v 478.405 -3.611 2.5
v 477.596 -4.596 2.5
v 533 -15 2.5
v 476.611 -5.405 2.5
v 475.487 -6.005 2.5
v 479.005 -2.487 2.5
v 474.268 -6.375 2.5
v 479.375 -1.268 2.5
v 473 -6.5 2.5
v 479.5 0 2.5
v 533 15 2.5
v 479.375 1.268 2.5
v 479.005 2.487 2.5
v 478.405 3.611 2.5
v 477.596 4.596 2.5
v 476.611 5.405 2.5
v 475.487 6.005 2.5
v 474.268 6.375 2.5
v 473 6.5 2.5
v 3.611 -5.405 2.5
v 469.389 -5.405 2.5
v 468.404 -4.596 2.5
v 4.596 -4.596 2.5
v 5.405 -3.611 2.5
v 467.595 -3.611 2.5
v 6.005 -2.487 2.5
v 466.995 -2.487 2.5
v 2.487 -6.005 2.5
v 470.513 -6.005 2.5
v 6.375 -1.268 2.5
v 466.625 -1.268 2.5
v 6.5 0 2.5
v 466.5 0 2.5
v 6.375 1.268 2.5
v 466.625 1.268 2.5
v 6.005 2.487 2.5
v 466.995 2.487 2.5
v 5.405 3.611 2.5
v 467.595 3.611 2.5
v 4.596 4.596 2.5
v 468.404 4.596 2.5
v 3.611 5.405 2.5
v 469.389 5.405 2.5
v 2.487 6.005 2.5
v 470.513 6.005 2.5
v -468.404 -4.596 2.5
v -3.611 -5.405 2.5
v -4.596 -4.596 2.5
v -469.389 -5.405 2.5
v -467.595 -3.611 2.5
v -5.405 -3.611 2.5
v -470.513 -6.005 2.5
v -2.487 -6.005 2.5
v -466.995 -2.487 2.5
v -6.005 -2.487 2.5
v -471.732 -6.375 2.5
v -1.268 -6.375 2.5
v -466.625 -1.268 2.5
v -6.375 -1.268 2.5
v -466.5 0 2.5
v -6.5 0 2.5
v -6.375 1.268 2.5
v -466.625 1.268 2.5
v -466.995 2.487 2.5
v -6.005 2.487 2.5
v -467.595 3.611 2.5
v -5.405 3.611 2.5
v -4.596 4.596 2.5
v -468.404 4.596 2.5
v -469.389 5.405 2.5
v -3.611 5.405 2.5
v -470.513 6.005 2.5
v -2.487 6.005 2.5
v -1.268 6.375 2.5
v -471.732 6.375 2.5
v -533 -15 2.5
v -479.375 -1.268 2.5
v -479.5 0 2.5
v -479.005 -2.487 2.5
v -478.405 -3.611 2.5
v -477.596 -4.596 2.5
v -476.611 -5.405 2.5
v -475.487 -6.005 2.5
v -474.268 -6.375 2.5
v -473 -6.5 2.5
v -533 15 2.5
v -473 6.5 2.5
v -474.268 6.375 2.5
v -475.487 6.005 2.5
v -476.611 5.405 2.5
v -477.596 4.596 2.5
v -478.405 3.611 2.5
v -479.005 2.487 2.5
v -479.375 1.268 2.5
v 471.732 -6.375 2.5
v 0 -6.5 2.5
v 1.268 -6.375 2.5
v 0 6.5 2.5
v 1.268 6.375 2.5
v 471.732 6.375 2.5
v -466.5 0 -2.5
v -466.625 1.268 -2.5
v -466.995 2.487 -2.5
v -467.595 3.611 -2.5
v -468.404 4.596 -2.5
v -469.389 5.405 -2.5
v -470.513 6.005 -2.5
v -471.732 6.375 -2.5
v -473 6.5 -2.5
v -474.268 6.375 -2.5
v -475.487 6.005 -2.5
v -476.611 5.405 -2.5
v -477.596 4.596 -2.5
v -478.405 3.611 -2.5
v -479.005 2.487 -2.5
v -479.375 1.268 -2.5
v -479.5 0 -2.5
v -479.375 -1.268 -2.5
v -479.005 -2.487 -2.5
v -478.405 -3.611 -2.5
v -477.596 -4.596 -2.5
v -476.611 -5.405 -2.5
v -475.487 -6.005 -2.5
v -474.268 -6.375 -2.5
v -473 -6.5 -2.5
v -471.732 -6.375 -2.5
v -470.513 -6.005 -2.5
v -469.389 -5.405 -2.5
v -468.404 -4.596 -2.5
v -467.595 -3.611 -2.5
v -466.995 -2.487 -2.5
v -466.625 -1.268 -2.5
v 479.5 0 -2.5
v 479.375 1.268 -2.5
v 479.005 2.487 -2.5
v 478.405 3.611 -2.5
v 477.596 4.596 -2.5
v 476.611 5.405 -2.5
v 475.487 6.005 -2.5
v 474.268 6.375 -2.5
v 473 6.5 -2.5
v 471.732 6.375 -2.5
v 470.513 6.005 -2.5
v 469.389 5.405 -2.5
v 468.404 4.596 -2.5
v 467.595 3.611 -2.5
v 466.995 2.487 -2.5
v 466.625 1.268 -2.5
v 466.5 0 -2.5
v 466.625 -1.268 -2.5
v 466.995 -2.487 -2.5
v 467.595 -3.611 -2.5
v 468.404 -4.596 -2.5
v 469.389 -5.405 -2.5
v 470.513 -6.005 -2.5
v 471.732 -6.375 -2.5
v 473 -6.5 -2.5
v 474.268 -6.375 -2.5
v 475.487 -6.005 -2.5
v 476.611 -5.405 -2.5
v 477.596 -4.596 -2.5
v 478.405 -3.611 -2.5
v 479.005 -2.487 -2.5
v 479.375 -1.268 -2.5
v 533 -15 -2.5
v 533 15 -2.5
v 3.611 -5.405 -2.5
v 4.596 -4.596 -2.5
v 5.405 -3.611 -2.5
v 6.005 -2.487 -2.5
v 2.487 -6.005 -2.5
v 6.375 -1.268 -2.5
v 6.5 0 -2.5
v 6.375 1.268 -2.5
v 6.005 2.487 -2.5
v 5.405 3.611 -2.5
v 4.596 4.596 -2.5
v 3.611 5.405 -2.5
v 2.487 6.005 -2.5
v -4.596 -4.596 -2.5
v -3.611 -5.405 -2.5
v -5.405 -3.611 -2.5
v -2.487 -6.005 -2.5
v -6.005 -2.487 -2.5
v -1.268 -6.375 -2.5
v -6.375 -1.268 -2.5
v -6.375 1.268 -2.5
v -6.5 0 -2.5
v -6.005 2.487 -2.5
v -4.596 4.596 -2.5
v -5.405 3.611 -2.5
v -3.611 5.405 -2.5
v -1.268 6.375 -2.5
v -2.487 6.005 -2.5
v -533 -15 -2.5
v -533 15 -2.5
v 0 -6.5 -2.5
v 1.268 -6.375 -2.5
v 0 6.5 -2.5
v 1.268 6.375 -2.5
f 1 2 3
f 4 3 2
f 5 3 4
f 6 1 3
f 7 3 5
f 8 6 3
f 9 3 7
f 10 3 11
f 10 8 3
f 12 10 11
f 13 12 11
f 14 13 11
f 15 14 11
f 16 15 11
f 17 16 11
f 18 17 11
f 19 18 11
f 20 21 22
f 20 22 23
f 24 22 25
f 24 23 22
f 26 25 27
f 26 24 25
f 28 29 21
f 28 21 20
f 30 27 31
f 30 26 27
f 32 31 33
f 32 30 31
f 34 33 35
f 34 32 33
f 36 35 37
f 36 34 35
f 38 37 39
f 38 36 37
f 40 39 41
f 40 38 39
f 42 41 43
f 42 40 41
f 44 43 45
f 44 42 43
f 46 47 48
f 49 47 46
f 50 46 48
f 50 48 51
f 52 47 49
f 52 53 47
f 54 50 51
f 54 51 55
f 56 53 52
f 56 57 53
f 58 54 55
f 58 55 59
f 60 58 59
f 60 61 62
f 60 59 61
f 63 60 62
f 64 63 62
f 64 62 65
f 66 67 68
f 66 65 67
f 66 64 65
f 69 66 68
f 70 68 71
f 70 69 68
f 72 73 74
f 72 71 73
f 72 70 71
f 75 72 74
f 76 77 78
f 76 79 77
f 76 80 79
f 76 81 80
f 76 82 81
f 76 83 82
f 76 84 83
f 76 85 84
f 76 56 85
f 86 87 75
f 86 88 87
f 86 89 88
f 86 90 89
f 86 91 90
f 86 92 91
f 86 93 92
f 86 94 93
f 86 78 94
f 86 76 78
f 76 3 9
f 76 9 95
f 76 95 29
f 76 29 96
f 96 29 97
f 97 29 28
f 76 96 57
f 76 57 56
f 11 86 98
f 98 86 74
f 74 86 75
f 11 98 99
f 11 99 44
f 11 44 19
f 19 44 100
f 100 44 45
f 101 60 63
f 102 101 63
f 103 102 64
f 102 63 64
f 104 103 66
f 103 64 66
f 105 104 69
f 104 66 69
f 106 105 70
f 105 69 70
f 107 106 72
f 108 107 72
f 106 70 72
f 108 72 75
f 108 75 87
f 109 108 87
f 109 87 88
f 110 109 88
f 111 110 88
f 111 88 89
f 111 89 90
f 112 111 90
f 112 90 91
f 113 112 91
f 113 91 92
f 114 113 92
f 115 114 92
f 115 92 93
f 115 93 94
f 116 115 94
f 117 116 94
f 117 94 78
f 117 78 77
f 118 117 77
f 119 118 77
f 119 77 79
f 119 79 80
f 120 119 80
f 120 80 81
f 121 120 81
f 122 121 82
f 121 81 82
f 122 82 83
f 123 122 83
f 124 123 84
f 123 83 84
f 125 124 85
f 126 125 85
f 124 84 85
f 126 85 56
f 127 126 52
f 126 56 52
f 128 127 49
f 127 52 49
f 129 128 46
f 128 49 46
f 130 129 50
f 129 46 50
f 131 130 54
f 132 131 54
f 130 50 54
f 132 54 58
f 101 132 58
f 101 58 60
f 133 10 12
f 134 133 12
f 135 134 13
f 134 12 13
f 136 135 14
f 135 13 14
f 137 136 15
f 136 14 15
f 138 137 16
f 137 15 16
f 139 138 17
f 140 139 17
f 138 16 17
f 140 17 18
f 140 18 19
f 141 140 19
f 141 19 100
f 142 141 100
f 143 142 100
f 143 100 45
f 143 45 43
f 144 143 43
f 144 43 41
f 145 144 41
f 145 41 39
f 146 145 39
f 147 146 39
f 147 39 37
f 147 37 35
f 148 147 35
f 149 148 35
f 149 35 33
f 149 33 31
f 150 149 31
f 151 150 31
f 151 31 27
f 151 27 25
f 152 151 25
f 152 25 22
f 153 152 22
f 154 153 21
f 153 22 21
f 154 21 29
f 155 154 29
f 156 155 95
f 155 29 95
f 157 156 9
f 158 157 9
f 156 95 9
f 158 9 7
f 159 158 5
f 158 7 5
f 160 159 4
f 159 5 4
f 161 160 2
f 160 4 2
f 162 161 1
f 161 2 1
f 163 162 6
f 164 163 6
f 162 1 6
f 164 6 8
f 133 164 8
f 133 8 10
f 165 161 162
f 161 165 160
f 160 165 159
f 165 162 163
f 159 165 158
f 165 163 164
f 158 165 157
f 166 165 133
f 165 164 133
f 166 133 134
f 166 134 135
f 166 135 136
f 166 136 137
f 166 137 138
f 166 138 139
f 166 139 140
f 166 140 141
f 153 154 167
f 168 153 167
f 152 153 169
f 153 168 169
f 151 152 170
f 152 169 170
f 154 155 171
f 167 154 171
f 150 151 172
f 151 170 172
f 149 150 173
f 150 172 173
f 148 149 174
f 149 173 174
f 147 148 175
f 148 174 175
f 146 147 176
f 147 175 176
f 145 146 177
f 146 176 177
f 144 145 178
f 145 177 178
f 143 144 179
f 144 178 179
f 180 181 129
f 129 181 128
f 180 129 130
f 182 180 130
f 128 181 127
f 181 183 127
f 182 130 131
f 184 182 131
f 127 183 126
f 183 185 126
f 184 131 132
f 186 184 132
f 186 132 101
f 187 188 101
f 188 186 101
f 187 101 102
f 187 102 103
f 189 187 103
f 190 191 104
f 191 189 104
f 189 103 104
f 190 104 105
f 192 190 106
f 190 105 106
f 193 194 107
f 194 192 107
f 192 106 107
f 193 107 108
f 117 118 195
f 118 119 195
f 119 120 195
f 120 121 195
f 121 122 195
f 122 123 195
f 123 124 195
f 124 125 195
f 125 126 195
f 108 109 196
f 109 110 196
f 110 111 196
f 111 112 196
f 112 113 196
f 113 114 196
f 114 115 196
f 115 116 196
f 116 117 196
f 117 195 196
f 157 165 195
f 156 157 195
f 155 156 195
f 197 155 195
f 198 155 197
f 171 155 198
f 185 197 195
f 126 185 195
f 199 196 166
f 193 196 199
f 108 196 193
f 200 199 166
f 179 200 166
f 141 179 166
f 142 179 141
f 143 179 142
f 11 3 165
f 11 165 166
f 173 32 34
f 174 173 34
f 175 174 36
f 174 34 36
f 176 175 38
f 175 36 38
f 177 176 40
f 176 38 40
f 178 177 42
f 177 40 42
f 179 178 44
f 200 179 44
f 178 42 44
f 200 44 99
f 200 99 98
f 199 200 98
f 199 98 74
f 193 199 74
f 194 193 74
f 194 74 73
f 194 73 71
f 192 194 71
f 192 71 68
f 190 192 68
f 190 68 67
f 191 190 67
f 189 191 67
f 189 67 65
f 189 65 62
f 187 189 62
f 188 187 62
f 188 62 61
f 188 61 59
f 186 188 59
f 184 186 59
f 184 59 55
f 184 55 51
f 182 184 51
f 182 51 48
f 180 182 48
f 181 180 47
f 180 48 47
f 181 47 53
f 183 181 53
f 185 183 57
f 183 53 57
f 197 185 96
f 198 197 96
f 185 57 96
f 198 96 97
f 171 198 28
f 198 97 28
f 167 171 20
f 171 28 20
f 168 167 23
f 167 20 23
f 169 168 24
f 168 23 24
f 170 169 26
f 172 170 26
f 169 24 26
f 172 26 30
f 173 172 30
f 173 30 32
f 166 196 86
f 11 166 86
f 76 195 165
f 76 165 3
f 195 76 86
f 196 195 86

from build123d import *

# Parameters (mm, degrees)
PLAT_W                          = 30
PLAT_H                          = 5
EL_MENT_M_CANO_SOUD_1_DEPTH     = 1066
DIAM_TRE_DU_PER_AGE_13_0_13_1_D = 13
R_P_TITION_LIN_AIRE2_COUNT      = 3
R_P_TITION_LIN_AIRE2_PITCH      = 473


with BuildPart() as part:
    # plat → Elément mécano-soudé1 (new body)
    with BuildSketch(Plane.YZ.offset(-533)):
        Rectangle(PLAT_W, PLAT_H)
    extrude(amount=EL_MENT_M_CANO_SOUD_1_DEPTH)

    # Diamètre du perçage Ø13.0 (13)1 (through all)
    with Locations(Plane(origin=(0, 0, -2.5), x_dir=(-1, 0, 0), z_dir=(0, 0, -1))):
        with Locations((473, 0)):
            diam_tre_du_per_age_13_0_13_1 = Hole(DIAM_TRE_DU_PER_AGE_13_0_13_1_D / 2)

    # Répétition linéaire2: Diamètre du perçage Ø13.0 (13)1 ×3
    with Locations(*[(i * R_P_TITION_LIN_AIRE2_PITCH, 0, 0) for i in range(1, R_P_TITION_LIN_AIRE2_COUNT)]):
        add(diam_tre_du_per_age_13_0_13_1, mode=Mode.SUBTRACT)


solid = part.part
